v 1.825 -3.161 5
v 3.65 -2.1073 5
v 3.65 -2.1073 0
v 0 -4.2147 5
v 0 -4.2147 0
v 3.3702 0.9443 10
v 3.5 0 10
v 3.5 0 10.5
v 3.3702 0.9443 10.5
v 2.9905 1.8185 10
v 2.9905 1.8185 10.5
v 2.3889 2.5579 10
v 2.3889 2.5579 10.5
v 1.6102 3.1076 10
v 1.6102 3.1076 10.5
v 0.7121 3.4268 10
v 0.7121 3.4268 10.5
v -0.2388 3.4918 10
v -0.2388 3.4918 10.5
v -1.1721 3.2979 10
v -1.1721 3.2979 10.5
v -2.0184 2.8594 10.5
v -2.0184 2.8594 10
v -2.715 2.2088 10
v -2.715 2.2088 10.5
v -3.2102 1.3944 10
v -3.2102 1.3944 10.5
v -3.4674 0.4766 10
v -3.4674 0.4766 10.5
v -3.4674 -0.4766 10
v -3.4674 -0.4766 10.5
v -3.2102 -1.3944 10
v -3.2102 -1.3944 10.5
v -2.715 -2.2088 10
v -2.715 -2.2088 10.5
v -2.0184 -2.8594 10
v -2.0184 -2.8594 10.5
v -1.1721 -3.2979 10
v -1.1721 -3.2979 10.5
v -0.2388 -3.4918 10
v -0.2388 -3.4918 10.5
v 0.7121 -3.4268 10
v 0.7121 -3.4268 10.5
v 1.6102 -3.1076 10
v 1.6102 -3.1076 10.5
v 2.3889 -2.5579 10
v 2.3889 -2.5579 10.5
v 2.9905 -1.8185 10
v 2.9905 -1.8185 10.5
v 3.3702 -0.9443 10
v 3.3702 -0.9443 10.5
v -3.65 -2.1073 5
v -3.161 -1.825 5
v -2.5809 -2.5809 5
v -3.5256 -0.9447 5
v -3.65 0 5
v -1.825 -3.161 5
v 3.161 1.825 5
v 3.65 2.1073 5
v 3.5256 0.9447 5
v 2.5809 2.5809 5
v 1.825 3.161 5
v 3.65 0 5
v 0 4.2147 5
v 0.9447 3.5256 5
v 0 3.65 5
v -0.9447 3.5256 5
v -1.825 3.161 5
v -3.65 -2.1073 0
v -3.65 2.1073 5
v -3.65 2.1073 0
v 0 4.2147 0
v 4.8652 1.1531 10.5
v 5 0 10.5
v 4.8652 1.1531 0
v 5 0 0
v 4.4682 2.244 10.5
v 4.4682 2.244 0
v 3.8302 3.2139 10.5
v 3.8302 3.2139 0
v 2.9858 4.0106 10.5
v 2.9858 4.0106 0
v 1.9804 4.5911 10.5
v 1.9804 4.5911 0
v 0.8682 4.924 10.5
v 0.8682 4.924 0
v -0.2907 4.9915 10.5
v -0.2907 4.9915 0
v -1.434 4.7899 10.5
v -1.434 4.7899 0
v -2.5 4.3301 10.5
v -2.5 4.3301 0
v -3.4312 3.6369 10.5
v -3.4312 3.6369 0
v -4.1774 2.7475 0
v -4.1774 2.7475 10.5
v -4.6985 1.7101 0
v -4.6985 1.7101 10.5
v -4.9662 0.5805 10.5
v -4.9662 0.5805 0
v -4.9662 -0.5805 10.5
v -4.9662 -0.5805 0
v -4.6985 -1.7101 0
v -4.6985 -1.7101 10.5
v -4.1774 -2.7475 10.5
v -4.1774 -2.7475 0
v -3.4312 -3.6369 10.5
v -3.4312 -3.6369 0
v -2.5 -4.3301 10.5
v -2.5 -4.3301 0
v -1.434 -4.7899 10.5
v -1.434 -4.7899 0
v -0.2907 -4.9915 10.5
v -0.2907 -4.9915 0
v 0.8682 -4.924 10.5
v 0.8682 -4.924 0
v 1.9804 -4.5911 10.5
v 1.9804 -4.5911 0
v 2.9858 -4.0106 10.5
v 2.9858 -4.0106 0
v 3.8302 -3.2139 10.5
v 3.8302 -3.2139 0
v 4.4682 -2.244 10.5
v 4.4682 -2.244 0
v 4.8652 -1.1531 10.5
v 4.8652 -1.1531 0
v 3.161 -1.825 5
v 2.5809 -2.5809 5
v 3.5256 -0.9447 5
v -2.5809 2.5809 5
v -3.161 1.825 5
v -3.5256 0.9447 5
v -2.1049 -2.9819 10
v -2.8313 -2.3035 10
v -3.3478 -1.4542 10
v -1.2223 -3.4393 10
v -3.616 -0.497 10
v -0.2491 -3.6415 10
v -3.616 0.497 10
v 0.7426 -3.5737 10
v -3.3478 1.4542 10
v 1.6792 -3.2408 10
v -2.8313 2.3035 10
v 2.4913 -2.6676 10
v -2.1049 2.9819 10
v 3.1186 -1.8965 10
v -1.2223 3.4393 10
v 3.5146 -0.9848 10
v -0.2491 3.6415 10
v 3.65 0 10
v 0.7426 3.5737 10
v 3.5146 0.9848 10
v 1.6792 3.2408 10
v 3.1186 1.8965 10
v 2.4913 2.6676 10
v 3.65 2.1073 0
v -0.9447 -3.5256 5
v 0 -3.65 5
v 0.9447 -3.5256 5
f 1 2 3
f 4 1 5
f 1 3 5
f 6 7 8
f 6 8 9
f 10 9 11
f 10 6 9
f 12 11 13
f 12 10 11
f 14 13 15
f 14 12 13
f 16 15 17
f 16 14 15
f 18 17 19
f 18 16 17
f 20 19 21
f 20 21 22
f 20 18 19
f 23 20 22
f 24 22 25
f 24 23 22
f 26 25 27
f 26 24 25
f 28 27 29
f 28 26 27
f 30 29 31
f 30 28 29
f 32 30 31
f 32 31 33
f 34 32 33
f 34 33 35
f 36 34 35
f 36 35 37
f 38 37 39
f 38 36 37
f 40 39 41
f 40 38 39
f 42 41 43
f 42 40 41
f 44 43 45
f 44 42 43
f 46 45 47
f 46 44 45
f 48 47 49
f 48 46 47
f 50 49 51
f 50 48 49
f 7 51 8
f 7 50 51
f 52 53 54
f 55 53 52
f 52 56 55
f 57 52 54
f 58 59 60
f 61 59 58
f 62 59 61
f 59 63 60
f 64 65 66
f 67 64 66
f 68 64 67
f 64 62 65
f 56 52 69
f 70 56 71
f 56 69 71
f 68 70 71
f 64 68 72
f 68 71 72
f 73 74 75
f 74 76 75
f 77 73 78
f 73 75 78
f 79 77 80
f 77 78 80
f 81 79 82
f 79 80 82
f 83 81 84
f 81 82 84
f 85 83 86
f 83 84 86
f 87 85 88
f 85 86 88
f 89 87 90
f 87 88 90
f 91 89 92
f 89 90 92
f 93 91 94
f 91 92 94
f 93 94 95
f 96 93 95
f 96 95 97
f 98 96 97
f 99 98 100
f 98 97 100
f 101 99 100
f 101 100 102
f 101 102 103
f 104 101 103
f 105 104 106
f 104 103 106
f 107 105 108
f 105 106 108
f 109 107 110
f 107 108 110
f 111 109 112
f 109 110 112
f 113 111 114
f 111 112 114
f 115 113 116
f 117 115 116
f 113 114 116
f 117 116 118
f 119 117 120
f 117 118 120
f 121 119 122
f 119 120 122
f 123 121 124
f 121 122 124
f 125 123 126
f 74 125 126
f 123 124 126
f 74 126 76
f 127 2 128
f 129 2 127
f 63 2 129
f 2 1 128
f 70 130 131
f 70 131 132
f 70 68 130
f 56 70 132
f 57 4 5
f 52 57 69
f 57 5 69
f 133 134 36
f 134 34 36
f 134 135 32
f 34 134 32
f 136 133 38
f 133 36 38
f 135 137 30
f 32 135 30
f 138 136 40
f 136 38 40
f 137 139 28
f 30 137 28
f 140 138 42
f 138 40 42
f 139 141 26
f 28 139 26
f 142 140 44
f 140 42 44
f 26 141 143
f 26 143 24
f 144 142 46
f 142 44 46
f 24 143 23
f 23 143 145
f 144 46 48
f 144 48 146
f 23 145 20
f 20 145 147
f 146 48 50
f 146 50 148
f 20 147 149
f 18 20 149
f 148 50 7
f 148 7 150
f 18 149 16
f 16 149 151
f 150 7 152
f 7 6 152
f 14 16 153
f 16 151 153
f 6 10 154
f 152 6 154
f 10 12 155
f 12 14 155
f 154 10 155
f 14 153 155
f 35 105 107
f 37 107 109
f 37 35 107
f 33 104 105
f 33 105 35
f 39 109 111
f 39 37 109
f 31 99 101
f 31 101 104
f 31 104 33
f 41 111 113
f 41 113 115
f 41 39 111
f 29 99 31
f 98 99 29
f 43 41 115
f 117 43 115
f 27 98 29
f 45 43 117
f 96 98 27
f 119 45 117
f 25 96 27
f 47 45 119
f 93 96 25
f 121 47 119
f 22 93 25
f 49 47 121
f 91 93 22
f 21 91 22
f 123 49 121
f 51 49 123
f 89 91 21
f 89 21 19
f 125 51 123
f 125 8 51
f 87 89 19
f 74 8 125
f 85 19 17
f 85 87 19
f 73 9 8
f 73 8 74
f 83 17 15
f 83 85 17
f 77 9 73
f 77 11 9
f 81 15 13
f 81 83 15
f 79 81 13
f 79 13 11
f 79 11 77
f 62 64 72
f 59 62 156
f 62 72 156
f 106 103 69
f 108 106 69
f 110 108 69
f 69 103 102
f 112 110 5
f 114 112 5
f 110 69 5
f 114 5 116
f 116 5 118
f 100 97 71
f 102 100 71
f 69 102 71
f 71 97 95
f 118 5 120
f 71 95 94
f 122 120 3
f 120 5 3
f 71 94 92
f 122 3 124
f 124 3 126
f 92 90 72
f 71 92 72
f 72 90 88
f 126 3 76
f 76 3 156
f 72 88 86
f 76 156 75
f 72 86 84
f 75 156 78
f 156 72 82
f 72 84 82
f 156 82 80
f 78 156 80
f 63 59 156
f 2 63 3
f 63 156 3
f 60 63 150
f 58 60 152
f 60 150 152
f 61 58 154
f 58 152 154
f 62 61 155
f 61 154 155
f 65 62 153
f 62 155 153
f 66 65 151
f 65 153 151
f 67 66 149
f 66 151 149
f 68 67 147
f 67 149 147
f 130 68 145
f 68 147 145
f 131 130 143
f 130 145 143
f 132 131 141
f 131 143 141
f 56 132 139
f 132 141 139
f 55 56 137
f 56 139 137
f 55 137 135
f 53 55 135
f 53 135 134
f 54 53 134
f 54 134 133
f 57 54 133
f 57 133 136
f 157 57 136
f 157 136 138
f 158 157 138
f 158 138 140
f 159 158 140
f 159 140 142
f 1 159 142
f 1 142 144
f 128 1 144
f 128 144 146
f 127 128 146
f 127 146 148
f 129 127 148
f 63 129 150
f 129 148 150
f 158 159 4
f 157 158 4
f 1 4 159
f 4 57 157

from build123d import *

# Parameters (mm, degrees)
SKETCH1_R           = 5
BOSS_EXTRUDE1_DEPTH = 10
SKETCH2_R           = 3.65
CUT_EXTRUDE1_DEPTH  = 10
CUT_EXTRUDE2_DEPTH  = 5
SKETCH5_R           = 5
SKETCH5_R_2         = 3.5
BOSS_EXTRUDE3_DEPTH = 0.5


with BuildPart() as part:
    # Sketch1 → Boss-Extrude1 (new body)
    with BuildSketch(Plane.XY):
        Circle(SKETCH1_R)
    extrude(amount=BOSS_EXTRUDE1_DEPTH)

    # Sketch2 → Cut-Extrude1 (cut)
    with BuildSketch(Plane.XY.offset(10)):
        Circle(SKETCH2_R)
    extrude(amount=-CUT_EXTRUDE1_DEPTH, mode=Mode.SUBTRACT)

    # Sketch4 → Cut-Extrude2 (cut)
    with BuildSketch(Plane(origin=(0, 0, 0), x_dir=(-1, 0, 0), z_dir=(0, 0, -1))):
        Polygon((0, 4.214656965), (-3.65, 2.107328483), (-3.65, -2.107328483), (0, -4.214656965), (3.65, -2.107328483), (3.65, 2.107328483), align=None)
    extrude(amount=-CUT_EXTRUDE2_DEPTH, mode=Mode.SUBTRACT)

    # Sketch5 → Boss-Extrude3 (add)
    with BuildSketch(Plane.XY.offset(10)):
        Circle(SKETCH5_R)
        Circle(SKETCH5_R_2, mode=Mode.SUBTRACT)
    extrude(amount=BOSS_EXTRUDE3_DEPTH)


solid = part.part
